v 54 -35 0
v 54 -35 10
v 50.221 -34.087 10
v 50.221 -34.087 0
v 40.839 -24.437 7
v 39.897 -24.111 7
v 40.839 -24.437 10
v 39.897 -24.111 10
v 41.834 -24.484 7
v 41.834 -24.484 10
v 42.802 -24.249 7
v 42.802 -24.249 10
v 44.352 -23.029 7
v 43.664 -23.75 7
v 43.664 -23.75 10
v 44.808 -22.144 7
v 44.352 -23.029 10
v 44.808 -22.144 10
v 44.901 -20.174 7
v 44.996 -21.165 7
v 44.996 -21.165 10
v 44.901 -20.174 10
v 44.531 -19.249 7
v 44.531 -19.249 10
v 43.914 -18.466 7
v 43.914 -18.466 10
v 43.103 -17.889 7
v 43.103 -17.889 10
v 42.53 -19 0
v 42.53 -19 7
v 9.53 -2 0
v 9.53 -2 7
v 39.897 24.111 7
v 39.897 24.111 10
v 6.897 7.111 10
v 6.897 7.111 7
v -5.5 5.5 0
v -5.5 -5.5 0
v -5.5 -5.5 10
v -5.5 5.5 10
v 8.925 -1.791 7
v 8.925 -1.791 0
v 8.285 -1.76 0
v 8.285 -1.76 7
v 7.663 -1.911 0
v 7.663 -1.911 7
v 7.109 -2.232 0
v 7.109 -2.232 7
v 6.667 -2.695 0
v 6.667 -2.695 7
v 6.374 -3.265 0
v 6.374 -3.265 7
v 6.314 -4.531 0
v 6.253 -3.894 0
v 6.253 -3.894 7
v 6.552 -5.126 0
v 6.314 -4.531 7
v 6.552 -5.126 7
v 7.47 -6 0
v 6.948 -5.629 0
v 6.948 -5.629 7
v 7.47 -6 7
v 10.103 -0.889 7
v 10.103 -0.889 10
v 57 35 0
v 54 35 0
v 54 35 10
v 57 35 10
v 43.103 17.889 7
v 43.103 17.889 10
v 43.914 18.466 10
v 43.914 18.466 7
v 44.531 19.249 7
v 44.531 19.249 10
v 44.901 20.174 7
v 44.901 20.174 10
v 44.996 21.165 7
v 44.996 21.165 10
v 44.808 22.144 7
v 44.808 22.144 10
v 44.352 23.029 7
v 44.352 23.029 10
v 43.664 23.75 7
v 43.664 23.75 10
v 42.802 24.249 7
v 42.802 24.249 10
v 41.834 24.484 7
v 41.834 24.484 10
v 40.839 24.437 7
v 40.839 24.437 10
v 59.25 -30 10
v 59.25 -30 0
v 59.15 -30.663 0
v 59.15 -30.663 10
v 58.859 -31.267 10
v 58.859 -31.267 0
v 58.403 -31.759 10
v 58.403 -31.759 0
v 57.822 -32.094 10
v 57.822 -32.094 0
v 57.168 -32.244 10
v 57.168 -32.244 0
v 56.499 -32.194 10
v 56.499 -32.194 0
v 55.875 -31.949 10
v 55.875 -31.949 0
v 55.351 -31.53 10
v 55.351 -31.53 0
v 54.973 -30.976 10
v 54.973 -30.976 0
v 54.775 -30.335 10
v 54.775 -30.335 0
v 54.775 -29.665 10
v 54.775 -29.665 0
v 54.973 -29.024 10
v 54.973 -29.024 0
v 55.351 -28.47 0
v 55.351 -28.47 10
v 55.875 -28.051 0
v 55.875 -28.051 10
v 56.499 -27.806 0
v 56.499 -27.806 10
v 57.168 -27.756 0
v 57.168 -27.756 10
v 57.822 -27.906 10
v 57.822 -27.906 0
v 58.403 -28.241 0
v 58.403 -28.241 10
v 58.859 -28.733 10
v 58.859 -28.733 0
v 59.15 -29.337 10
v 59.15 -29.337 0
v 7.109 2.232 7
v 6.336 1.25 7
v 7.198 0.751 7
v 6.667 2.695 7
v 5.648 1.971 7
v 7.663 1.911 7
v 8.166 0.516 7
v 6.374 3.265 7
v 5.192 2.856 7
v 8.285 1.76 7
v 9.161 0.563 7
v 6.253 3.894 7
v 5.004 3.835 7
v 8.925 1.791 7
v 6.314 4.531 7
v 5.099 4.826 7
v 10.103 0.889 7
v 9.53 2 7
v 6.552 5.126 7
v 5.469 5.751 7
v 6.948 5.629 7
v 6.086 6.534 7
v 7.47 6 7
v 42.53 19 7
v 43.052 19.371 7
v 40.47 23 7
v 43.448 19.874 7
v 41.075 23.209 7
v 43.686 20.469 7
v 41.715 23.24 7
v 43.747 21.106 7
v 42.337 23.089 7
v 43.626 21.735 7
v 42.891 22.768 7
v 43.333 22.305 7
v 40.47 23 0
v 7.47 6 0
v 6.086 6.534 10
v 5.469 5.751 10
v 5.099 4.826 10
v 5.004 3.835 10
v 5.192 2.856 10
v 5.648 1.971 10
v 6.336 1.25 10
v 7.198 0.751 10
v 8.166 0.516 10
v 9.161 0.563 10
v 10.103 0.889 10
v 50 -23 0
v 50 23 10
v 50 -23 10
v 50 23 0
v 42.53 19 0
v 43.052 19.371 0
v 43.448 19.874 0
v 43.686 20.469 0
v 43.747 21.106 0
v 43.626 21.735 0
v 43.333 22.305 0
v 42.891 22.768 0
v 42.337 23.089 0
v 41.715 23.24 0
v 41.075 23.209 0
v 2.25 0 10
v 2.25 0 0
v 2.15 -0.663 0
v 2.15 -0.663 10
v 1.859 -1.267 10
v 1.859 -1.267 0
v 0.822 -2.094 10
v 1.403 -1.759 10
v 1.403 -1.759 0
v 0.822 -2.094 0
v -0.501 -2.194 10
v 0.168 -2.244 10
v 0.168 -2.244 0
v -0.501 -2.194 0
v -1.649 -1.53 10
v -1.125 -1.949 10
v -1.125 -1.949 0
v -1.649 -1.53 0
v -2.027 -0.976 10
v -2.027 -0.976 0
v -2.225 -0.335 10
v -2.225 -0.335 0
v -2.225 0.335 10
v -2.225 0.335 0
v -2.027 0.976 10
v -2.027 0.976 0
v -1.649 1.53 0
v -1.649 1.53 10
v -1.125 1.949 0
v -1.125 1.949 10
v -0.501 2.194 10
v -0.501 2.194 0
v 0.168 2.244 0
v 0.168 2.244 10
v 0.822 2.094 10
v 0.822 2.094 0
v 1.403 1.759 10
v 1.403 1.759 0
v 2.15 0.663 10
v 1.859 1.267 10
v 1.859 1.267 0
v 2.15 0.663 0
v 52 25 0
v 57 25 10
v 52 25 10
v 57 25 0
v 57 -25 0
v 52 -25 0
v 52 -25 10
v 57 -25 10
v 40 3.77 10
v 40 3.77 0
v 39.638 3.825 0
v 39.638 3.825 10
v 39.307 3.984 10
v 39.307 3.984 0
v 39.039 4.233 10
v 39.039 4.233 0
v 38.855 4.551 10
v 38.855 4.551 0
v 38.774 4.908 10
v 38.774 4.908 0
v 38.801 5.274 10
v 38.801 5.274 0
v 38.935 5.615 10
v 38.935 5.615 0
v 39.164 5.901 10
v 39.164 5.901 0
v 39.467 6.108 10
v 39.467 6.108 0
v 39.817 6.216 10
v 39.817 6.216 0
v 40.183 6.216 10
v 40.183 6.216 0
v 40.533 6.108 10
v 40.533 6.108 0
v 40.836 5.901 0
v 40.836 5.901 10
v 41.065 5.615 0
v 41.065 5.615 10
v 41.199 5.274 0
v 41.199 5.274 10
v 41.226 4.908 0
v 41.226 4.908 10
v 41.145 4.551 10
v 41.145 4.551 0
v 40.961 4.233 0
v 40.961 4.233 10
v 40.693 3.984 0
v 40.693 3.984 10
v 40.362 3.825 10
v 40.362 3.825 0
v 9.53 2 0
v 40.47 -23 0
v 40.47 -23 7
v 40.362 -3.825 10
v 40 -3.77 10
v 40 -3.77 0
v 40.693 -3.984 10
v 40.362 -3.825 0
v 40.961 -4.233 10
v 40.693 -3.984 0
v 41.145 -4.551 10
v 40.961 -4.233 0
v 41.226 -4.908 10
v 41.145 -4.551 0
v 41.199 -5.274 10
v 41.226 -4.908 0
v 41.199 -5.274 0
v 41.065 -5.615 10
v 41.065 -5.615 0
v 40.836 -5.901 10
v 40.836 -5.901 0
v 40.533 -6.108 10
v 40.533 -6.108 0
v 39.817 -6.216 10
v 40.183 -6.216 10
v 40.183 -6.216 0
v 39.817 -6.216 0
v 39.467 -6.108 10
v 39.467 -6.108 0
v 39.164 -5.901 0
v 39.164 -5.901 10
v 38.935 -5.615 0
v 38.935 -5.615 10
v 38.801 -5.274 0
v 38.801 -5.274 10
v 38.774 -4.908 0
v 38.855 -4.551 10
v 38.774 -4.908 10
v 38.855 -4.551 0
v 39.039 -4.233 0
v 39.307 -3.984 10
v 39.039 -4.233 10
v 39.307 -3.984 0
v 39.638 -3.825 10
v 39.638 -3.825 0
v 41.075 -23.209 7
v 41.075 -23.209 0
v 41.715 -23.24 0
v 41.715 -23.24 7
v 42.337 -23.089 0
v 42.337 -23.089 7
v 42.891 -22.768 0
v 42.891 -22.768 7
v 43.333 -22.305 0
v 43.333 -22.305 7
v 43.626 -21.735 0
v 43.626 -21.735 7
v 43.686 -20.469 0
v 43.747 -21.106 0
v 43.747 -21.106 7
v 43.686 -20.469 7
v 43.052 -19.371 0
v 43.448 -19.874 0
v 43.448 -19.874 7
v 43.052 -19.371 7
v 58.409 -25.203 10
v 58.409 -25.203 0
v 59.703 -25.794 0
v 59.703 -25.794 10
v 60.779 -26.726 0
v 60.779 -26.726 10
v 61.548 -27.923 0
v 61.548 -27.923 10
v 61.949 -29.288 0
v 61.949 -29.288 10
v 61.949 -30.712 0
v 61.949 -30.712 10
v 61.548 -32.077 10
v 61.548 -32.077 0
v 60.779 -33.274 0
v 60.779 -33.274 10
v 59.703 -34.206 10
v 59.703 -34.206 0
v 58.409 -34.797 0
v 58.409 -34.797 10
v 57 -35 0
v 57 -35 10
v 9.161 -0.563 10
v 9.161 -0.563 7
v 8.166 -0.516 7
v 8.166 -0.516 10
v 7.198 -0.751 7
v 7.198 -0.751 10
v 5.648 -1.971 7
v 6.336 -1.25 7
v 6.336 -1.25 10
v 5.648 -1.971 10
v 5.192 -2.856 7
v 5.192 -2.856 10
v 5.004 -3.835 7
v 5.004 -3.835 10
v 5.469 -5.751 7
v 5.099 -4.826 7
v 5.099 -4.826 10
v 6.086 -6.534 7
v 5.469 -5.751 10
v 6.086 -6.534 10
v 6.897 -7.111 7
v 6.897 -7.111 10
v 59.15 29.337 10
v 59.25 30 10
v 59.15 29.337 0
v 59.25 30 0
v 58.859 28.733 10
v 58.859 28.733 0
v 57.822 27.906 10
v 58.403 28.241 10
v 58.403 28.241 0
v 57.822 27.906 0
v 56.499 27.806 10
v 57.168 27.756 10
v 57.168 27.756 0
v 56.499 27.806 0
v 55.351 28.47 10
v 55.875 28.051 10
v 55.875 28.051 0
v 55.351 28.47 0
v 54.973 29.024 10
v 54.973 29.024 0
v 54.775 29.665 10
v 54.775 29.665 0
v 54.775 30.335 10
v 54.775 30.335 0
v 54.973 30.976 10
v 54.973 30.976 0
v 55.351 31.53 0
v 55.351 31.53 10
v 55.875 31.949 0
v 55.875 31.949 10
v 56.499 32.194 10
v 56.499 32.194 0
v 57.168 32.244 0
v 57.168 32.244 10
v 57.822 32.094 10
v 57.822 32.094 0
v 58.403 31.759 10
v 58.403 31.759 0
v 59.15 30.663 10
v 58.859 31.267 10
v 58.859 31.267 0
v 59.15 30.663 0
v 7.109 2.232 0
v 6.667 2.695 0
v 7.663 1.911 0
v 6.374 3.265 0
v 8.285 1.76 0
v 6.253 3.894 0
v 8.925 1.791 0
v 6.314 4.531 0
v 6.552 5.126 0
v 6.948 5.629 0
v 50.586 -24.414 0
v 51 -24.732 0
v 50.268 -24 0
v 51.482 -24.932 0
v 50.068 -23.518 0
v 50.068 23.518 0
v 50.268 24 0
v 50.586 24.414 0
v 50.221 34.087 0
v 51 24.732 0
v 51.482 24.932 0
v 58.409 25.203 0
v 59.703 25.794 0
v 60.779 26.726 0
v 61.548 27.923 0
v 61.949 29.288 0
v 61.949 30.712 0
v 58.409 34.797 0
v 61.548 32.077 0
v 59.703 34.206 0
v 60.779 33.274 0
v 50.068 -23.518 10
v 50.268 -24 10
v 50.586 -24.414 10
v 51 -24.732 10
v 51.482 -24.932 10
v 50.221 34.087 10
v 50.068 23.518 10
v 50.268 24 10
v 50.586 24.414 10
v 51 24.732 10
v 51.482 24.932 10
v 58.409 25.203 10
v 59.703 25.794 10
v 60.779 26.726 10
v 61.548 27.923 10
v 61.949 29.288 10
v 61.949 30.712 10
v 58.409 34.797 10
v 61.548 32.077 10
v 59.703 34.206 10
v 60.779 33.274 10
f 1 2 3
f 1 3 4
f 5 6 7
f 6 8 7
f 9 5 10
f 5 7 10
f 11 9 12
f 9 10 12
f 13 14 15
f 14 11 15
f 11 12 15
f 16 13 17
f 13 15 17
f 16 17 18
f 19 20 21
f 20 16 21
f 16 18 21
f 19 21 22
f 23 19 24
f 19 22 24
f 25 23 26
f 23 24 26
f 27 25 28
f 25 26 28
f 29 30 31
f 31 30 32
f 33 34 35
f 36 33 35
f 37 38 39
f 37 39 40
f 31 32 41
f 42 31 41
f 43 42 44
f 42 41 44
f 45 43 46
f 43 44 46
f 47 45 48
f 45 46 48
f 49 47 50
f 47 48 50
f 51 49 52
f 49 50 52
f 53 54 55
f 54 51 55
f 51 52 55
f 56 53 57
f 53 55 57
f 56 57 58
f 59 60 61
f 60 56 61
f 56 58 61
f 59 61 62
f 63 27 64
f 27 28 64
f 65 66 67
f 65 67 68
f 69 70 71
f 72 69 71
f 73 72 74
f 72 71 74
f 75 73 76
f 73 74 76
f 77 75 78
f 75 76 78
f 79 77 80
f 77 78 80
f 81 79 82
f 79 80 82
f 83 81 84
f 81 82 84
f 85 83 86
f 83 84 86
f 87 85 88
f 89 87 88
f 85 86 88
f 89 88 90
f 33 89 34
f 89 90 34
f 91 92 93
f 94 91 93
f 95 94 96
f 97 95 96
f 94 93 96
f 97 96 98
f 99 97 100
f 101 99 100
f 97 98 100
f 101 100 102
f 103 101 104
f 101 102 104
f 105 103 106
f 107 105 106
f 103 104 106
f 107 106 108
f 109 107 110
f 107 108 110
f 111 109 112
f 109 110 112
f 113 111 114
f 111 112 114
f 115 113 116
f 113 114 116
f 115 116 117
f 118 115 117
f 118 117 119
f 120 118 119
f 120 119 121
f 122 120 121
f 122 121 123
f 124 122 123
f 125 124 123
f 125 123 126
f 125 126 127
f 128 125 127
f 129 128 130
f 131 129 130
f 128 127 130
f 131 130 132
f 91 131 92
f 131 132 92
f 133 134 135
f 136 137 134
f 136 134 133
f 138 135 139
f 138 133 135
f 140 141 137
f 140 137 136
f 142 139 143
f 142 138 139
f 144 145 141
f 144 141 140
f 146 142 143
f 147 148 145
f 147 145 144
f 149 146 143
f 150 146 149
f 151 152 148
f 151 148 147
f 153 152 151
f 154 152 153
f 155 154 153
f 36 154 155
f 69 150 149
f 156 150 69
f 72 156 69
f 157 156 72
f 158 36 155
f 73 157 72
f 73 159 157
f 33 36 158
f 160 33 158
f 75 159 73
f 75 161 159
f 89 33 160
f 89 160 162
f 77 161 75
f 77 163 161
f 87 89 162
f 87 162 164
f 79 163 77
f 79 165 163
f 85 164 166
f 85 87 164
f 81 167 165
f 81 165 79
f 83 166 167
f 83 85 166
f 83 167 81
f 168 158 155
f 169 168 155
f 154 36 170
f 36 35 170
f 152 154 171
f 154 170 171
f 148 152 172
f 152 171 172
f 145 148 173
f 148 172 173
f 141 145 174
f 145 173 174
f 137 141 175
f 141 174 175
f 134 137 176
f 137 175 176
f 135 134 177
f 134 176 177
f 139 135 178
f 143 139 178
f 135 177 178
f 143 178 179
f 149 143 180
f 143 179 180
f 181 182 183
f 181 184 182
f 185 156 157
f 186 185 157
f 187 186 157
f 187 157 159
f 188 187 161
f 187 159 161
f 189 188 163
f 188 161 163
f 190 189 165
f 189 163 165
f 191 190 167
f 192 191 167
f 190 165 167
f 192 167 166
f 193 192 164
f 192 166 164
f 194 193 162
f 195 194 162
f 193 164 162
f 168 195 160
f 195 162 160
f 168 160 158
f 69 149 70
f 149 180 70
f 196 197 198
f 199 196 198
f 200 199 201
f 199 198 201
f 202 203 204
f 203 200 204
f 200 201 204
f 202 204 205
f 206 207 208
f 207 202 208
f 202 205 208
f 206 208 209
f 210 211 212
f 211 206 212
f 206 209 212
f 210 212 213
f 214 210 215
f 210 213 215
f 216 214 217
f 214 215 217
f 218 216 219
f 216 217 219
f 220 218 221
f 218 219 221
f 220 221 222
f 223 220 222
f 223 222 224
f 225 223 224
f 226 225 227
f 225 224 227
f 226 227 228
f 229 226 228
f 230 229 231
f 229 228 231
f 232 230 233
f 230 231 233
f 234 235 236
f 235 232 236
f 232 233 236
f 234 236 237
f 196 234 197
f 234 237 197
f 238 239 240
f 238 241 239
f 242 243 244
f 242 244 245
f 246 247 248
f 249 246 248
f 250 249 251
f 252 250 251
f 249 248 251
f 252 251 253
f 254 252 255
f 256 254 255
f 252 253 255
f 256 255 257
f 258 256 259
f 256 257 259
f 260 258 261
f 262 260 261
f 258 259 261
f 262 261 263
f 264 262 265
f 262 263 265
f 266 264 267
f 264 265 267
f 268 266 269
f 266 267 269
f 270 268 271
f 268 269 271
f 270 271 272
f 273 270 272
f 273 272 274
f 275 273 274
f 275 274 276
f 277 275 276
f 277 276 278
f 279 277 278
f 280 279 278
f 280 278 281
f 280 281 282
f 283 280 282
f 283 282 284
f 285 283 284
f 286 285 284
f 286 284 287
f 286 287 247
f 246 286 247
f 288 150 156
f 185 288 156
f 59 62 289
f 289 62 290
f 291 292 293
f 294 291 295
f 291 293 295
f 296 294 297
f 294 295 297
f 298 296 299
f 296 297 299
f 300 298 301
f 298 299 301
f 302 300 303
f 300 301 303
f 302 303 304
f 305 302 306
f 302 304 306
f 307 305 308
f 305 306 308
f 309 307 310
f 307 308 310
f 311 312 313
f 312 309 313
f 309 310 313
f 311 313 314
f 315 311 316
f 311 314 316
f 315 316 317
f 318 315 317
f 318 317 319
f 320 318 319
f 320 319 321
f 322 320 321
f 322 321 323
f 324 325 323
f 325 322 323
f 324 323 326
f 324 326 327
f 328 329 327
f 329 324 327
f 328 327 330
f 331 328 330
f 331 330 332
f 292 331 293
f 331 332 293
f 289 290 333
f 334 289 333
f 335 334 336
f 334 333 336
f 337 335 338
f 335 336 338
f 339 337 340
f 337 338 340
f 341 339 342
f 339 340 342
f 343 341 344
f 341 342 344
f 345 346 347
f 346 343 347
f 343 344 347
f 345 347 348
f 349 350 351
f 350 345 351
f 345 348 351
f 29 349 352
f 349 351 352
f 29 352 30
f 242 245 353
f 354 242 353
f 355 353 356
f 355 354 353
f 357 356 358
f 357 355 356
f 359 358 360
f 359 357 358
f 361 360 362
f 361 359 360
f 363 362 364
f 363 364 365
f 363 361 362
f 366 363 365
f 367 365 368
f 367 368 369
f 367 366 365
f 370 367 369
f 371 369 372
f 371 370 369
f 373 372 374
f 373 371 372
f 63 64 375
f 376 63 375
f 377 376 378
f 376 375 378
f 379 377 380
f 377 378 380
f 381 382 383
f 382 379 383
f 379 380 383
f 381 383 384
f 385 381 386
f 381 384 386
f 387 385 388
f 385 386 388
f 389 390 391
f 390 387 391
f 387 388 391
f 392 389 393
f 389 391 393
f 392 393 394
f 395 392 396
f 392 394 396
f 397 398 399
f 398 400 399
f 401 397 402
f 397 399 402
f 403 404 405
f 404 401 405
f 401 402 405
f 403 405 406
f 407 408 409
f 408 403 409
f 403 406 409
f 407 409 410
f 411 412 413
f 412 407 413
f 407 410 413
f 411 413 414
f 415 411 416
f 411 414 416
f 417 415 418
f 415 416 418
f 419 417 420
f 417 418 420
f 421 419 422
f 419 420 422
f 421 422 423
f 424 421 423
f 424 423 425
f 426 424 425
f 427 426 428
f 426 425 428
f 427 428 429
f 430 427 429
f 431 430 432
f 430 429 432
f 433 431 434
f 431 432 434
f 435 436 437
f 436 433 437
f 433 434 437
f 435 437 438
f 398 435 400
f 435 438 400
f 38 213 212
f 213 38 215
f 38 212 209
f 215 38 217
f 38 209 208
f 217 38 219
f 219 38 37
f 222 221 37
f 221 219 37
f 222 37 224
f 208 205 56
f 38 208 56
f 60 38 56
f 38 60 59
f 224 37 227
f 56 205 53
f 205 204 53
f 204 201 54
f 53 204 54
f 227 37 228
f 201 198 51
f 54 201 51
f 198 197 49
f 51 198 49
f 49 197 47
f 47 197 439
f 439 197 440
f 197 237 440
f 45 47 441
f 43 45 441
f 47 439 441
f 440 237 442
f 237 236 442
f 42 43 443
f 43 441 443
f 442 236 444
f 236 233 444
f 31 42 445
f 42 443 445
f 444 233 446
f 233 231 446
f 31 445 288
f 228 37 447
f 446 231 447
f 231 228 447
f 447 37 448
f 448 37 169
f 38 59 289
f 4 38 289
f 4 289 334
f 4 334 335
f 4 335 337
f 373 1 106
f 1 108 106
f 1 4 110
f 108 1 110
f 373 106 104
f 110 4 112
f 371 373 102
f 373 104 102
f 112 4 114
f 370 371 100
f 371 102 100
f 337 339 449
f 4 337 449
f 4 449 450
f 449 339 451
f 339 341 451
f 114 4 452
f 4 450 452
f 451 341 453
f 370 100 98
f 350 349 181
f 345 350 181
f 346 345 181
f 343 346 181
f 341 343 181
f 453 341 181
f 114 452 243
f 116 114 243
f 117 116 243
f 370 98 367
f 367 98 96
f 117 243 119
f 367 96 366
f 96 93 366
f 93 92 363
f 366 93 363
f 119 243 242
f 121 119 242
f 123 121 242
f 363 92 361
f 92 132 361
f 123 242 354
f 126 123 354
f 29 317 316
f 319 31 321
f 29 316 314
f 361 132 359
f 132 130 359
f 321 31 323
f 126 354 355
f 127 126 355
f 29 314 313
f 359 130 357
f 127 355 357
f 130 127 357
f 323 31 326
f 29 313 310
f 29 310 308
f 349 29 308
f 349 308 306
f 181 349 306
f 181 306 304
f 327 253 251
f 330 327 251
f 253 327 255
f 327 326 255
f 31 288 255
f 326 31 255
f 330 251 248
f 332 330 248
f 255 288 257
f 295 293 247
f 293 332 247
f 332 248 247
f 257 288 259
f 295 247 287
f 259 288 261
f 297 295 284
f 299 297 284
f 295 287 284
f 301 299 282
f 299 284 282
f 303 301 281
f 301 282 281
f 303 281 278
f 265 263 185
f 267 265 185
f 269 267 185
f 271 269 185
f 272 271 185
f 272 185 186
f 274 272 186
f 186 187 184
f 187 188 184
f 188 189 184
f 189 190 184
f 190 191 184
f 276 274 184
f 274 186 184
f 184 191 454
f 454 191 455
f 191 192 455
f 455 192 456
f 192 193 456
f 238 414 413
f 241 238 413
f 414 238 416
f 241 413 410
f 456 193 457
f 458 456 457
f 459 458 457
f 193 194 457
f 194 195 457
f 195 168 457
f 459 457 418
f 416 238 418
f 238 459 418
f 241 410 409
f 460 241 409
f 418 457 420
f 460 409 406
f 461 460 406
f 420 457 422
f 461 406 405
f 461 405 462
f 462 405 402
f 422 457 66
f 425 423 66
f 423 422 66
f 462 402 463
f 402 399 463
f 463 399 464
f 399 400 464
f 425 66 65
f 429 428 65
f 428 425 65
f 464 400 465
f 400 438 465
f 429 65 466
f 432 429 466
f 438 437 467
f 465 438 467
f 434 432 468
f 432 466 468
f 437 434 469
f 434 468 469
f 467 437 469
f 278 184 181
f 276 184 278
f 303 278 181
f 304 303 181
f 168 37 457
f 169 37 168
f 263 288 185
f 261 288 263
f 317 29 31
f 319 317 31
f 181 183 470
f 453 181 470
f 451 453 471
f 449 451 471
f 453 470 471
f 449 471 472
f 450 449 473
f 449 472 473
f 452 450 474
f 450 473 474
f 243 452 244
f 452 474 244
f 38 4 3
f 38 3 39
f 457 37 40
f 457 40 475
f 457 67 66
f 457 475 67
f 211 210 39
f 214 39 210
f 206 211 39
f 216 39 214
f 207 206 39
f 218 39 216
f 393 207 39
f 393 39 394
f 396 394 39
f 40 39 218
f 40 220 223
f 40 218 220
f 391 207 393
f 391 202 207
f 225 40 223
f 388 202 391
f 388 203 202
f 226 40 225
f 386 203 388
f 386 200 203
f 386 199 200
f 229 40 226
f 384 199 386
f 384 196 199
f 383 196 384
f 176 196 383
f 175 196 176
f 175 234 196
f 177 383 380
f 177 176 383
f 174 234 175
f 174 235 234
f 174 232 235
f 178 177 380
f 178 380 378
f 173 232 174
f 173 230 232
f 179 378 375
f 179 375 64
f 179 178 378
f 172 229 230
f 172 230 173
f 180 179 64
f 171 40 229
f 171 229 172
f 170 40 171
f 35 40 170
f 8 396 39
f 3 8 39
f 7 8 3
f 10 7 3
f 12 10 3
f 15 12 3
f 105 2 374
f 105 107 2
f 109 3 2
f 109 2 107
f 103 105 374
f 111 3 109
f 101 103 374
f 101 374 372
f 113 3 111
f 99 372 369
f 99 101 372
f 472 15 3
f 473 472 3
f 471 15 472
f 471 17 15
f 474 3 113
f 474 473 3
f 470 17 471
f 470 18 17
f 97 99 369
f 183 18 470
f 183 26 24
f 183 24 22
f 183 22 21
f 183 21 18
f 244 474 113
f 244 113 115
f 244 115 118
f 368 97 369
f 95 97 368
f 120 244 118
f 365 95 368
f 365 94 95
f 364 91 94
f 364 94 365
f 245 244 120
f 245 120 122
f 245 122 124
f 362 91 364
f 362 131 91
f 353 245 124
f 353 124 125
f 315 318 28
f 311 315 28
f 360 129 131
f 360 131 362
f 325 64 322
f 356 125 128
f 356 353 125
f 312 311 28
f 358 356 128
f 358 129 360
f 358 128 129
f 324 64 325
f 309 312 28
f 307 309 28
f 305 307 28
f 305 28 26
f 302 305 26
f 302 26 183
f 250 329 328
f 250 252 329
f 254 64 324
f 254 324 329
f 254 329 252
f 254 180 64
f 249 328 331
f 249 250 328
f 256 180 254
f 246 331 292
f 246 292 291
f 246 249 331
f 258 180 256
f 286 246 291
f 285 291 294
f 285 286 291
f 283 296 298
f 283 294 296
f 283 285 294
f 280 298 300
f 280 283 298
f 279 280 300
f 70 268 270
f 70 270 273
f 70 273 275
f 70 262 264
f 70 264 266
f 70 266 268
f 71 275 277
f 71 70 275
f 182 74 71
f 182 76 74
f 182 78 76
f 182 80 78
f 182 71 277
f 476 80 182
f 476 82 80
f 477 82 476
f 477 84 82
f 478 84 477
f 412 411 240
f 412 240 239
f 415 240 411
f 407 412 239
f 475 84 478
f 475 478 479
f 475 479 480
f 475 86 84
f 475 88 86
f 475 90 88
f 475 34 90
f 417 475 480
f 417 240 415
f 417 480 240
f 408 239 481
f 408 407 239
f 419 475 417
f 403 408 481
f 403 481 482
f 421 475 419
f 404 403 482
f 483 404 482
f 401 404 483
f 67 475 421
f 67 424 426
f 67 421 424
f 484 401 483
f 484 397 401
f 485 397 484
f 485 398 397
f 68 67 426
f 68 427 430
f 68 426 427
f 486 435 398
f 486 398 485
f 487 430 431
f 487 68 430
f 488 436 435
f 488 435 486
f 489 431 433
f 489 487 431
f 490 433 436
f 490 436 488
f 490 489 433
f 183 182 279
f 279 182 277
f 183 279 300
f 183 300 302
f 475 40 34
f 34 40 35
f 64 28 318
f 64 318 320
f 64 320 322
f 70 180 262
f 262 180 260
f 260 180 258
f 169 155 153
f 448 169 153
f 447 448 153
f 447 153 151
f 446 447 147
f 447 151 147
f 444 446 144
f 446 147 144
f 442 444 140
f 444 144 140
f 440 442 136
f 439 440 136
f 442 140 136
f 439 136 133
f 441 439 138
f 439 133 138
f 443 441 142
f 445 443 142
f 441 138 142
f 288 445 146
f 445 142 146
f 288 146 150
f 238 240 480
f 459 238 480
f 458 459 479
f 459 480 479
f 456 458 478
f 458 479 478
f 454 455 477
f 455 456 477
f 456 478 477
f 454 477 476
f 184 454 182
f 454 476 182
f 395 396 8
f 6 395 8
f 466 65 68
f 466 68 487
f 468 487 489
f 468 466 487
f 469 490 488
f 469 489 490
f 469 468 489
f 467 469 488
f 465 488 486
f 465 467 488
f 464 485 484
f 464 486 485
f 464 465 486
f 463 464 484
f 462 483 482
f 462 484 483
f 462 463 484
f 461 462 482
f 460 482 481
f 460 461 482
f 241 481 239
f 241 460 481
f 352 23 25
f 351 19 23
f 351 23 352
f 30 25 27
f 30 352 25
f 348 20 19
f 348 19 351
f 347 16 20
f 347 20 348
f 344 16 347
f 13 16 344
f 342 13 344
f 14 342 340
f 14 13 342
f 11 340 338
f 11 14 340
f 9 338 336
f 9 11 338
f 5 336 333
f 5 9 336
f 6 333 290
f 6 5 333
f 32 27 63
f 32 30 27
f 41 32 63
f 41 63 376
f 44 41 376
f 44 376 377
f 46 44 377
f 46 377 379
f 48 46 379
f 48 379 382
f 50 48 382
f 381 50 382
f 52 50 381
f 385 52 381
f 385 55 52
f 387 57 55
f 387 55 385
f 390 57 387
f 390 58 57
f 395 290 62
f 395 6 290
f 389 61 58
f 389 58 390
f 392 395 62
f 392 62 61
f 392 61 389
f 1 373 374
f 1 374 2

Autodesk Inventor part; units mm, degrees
ref_plane "YZ Plane" through (0, 0, 0) normal (1, 0, 0) x (0, 1, 0)
ref_plane "XZ Plane" through (0, 0, 0) normal (0, 1, 0) x (-1, 0, 0)
ref_plane "XY Plane" through (0, 0, 0) normal (0, 0, 1) x (1, 0, 0)
sketch "Sketch1" plane through (0, 0, 0) normal (0, 0, 1) x (1, 0, 0)
  arc A0 (2.25, 0) -> (-2.25, 0) centre (0, 0) ccw
  line L0 (0, 0) -> (-2.25, 0) construction
  line L1 (0, 0) -> (2.25, 0) construction
  line L2 (5.5, 0) -> (-5.5, 0)
  line L3 (-5.5, 0) -> (-5.5, 5.5)
  line L4 (-5.5, 5.5) -> (5.5, 5.5)
  line L5 (5.5, 5.5) -> (5.5, 0)
  line L6 (-19, 0) -> (75.5, 0) projected
  circle A1 centre (57, 30) radius 2.25
  circle A2 centre (57, 30) radius 5
  line L7 (-5.5, 5.5) -> (52, 35)
  line L8 (52, 35) -> (57, 35)
  line L9 (57, 25) -> (50, 25)
  line L10 (50, 25) -> (50, 0)
  line L11 (-5.5, 0) -> (50, 0)
  point P0 (52, 30)
  point P1 (-2.25, 0)
  point P2 (50, 0)
  dimension "d0" = 2.25
  dimension "d1" = 180
  dimension "d2" = 11
  dimension "d3" = 5.5
  dimension "d4" = 4.5
  dimension "d5" = 10
  dimension "d6" = 25
  dimension "d7" = 90
  dimension "d8" = 55.5
  dimension "d42" = 64.6258
  dimension "d43" = 5
extrude "Extrusion1" add sketch "Sketch1" along normal blind 10 contours A0 L2 L3 L4 L5 | L5 L4 L7 L8 A2 L9 L10 L6 | A2
mirror "Mirror1" about plane through (0, 0, 0) normal (0, 1, 0)
fillet "Fillet1" radius 2 2 edges at (50, 25, 5) (50, -25, 5)
sketch "Sketch2" plane through (0, 0, 10) normal (0, 0, 1) x (1, 0, 0)
  circle A0 centre (0, 0) radius 2.25 projected
  line L0 (0, 0) -> (69.506, 0)
  line L1 (0, 0) -> (0, 32.0889)
  line L2 (41.5, 21) -> (8.5, 4) construction
  line L3 (40.4696, 23.0002) -> (7.4696, 6.0002)
  line L4 (9.5304, 1.9998) -> (42.5304, 18.9998)
  arc A1 (42.5304, 18.9998) -> (40.4696, 23.0002) centre (41.5, 21) ccw
  arc A2 (7.4696, 6.0002) -> (9.5304, 1.9998) centre (8.5, 4) ccw
  line L5 (41.5, 21) -> (8.5, 4) construction
  line L6 (39.8972, 24.1114) -> (6.8972, 7.1114)
  line L7 (10.1028, 0.8886) -> (43.1028, 17.8886)
  arc A3 (43.1028, 17.8886) -> (39.8972, 24.1114) centre (41.5, 21) ccw
  arc A4 (6.8972, 7.1114) -> (10.1028, 0.8886) centre (8.5, 4) ccw
  arc A5 (52, 25) -> (50, 23) centre (52, 23) ccw construction
  line L8 (52, 25) -> (57, 25) construction
  arc A6 (57, 25) -> (57, 35) centre (57, 30) ccw construction
  line L9 (57, 35) -> (52, 35) construction
  line L10 (52, 35) -> (-5.5, 5.5) construction
  line L11 (-5.5, 5.5) -> (-5.5, -5.5) construction
  line L12 (52, -35) -> (-5.5, -5.5) construction
  line L13 (57, -35) -> (52, -35) construction
  arc A7 (57, -35) -> (57, -25) centre (57, -30) ccw construction
  line L14 (52, -25) -> (57, -25) construction
  arc A8 (50, -23) -> (52, -25) centre (52, -23) ccw construction
  line L15 (50, 23) -> (50, -23) construction
  circle A9 centre (57, -30) radius 2.25 construction
  circle A10 centre (0, 0) radius 2.25 construction
  circle A11 centre (57, 30) radius 2.25 construction
  point P0 (25, 12.5)
  point P1 (25, 12.5)
  dimension "d15" = 4.5
  dimension "d16" = 7
  dimension "d38" = 47
  dimension "d39" = 14
  dimension "d40" = 4
  dimension "d41" = 21
extrude "Extrusion2" cut sketch "Sketch2" against normal blind 3 contours A3 L7 A4 L6
sketch "Sketch3" plane through (0, 0, 10) normal (0, 0, 1) x (1, 0, 0)
  arc A0 (42.5304, 18.9998) -> (40.4696, 23.0002) centre (41.5, 21) ccw projected
  arc A1 (7.4696, 6.0002) -> (9.5304, 1.9998) centre (8.5, 4) ccw projected
  line L0 (41.5, 21) -> (8.5, 4) construction
  line L1 (40.4696, 23.0002) -> (7.4696, 6.0002)
  line L2 (9.5304, 1.9998) -> (42.5304, 18.9998)
  arc A2 (42.5304, 18.9998) -> (40.4696, 23.0002) centre (41.5, 21) ccw
  arc A3 (7.4696, 6.0002) -> (9.5304, 1.9998) centre (8.5, 4) ccw
  point P0 (0, 0)
  point P1 (25, 12.5)
  dimension "d19" = 4.5
extrude "Extrusion3" cut sketch "Sketch3" against normal blind 10
mirror "Mirror2" about plane through (0, 0, 0) normal (0, 1, 0) of "Extrusion2", "Extrusion1", "Extrusion3"
sketch "Sketch4" plane through (0, 0, 10) normal (0, 0, 1) x (1, 0, 0)
  circle A0 centre (40, 5) radius 1.75
  point P0 (0, 0)
  dimension "d24" = 3.5
hole "Hole1" at (40, 5, 10) direction (0, 0, -1) diameter 2.459 end through all thread size "M3x0.5" class "6H" standard "ISO Metric profile"
mirror "Mirror6" about plane through (0, 0, 0) normal (0, 1, 0) of "Hole1", "Extrusion2", "Extrusion3"
chamfer "Chamfer1" distance 2 angle 45 1 edges at (52, 35, 5)
chamfer "Chamfer2" distance 2 angle 45 1 edges at (52, -35, 5)
properties part number "V structure"
